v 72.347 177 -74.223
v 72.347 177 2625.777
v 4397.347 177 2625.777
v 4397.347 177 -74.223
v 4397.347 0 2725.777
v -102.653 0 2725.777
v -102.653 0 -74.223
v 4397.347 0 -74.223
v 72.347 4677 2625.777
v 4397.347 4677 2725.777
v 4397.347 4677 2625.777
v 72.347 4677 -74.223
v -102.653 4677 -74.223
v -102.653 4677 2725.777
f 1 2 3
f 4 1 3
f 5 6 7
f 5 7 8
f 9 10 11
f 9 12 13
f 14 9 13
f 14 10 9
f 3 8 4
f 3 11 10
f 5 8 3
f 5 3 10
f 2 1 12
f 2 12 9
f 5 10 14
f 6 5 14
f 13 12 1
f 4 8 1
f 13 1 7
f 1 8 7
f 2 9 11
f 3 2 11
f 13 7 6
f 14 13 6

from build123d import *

# Parameters (mm, degrees)
F0_W     = 4500
F0_H     = 2800
F1_DEPTH = 177
F2_W     = 175
F2_H     = 2800
F3_DEPTH = 4500
F5_W     = 4500
F5_H     = 4677
F6_DEPTH = 100


with BuildPart() as f1:
    # F0 (on Front) → F1 (new body)
    with BuildSketch(Plane.XZ):
        with Locations((2147.34713, 1325.776631)):
            Rectangle(F0_W, F0_H)
    extrude(amount=-F1_DEPTH)

    # F2 (on face) → F3 (join)
    with BuildSketch(Plane(origin=(0, 177, 0), x_dir=(-1, 0, 0), z_dir=(0, 1, 0))):
        with Locations((15.15287, 1325.776631)):
            Rectangle(F2_W, F2_H)
    extrude(amount=F3_DEPTH)

    # F5 (on face) → F6 (join)
    with BuildSketch(Plane.XY.offset(2725.776631)):
        with Locations((2147.34713, 2338.5)):
            Rectangle(F5_W, F5_H)
    extrude(amount=-F6_DEPTH)


solid = f1.part
